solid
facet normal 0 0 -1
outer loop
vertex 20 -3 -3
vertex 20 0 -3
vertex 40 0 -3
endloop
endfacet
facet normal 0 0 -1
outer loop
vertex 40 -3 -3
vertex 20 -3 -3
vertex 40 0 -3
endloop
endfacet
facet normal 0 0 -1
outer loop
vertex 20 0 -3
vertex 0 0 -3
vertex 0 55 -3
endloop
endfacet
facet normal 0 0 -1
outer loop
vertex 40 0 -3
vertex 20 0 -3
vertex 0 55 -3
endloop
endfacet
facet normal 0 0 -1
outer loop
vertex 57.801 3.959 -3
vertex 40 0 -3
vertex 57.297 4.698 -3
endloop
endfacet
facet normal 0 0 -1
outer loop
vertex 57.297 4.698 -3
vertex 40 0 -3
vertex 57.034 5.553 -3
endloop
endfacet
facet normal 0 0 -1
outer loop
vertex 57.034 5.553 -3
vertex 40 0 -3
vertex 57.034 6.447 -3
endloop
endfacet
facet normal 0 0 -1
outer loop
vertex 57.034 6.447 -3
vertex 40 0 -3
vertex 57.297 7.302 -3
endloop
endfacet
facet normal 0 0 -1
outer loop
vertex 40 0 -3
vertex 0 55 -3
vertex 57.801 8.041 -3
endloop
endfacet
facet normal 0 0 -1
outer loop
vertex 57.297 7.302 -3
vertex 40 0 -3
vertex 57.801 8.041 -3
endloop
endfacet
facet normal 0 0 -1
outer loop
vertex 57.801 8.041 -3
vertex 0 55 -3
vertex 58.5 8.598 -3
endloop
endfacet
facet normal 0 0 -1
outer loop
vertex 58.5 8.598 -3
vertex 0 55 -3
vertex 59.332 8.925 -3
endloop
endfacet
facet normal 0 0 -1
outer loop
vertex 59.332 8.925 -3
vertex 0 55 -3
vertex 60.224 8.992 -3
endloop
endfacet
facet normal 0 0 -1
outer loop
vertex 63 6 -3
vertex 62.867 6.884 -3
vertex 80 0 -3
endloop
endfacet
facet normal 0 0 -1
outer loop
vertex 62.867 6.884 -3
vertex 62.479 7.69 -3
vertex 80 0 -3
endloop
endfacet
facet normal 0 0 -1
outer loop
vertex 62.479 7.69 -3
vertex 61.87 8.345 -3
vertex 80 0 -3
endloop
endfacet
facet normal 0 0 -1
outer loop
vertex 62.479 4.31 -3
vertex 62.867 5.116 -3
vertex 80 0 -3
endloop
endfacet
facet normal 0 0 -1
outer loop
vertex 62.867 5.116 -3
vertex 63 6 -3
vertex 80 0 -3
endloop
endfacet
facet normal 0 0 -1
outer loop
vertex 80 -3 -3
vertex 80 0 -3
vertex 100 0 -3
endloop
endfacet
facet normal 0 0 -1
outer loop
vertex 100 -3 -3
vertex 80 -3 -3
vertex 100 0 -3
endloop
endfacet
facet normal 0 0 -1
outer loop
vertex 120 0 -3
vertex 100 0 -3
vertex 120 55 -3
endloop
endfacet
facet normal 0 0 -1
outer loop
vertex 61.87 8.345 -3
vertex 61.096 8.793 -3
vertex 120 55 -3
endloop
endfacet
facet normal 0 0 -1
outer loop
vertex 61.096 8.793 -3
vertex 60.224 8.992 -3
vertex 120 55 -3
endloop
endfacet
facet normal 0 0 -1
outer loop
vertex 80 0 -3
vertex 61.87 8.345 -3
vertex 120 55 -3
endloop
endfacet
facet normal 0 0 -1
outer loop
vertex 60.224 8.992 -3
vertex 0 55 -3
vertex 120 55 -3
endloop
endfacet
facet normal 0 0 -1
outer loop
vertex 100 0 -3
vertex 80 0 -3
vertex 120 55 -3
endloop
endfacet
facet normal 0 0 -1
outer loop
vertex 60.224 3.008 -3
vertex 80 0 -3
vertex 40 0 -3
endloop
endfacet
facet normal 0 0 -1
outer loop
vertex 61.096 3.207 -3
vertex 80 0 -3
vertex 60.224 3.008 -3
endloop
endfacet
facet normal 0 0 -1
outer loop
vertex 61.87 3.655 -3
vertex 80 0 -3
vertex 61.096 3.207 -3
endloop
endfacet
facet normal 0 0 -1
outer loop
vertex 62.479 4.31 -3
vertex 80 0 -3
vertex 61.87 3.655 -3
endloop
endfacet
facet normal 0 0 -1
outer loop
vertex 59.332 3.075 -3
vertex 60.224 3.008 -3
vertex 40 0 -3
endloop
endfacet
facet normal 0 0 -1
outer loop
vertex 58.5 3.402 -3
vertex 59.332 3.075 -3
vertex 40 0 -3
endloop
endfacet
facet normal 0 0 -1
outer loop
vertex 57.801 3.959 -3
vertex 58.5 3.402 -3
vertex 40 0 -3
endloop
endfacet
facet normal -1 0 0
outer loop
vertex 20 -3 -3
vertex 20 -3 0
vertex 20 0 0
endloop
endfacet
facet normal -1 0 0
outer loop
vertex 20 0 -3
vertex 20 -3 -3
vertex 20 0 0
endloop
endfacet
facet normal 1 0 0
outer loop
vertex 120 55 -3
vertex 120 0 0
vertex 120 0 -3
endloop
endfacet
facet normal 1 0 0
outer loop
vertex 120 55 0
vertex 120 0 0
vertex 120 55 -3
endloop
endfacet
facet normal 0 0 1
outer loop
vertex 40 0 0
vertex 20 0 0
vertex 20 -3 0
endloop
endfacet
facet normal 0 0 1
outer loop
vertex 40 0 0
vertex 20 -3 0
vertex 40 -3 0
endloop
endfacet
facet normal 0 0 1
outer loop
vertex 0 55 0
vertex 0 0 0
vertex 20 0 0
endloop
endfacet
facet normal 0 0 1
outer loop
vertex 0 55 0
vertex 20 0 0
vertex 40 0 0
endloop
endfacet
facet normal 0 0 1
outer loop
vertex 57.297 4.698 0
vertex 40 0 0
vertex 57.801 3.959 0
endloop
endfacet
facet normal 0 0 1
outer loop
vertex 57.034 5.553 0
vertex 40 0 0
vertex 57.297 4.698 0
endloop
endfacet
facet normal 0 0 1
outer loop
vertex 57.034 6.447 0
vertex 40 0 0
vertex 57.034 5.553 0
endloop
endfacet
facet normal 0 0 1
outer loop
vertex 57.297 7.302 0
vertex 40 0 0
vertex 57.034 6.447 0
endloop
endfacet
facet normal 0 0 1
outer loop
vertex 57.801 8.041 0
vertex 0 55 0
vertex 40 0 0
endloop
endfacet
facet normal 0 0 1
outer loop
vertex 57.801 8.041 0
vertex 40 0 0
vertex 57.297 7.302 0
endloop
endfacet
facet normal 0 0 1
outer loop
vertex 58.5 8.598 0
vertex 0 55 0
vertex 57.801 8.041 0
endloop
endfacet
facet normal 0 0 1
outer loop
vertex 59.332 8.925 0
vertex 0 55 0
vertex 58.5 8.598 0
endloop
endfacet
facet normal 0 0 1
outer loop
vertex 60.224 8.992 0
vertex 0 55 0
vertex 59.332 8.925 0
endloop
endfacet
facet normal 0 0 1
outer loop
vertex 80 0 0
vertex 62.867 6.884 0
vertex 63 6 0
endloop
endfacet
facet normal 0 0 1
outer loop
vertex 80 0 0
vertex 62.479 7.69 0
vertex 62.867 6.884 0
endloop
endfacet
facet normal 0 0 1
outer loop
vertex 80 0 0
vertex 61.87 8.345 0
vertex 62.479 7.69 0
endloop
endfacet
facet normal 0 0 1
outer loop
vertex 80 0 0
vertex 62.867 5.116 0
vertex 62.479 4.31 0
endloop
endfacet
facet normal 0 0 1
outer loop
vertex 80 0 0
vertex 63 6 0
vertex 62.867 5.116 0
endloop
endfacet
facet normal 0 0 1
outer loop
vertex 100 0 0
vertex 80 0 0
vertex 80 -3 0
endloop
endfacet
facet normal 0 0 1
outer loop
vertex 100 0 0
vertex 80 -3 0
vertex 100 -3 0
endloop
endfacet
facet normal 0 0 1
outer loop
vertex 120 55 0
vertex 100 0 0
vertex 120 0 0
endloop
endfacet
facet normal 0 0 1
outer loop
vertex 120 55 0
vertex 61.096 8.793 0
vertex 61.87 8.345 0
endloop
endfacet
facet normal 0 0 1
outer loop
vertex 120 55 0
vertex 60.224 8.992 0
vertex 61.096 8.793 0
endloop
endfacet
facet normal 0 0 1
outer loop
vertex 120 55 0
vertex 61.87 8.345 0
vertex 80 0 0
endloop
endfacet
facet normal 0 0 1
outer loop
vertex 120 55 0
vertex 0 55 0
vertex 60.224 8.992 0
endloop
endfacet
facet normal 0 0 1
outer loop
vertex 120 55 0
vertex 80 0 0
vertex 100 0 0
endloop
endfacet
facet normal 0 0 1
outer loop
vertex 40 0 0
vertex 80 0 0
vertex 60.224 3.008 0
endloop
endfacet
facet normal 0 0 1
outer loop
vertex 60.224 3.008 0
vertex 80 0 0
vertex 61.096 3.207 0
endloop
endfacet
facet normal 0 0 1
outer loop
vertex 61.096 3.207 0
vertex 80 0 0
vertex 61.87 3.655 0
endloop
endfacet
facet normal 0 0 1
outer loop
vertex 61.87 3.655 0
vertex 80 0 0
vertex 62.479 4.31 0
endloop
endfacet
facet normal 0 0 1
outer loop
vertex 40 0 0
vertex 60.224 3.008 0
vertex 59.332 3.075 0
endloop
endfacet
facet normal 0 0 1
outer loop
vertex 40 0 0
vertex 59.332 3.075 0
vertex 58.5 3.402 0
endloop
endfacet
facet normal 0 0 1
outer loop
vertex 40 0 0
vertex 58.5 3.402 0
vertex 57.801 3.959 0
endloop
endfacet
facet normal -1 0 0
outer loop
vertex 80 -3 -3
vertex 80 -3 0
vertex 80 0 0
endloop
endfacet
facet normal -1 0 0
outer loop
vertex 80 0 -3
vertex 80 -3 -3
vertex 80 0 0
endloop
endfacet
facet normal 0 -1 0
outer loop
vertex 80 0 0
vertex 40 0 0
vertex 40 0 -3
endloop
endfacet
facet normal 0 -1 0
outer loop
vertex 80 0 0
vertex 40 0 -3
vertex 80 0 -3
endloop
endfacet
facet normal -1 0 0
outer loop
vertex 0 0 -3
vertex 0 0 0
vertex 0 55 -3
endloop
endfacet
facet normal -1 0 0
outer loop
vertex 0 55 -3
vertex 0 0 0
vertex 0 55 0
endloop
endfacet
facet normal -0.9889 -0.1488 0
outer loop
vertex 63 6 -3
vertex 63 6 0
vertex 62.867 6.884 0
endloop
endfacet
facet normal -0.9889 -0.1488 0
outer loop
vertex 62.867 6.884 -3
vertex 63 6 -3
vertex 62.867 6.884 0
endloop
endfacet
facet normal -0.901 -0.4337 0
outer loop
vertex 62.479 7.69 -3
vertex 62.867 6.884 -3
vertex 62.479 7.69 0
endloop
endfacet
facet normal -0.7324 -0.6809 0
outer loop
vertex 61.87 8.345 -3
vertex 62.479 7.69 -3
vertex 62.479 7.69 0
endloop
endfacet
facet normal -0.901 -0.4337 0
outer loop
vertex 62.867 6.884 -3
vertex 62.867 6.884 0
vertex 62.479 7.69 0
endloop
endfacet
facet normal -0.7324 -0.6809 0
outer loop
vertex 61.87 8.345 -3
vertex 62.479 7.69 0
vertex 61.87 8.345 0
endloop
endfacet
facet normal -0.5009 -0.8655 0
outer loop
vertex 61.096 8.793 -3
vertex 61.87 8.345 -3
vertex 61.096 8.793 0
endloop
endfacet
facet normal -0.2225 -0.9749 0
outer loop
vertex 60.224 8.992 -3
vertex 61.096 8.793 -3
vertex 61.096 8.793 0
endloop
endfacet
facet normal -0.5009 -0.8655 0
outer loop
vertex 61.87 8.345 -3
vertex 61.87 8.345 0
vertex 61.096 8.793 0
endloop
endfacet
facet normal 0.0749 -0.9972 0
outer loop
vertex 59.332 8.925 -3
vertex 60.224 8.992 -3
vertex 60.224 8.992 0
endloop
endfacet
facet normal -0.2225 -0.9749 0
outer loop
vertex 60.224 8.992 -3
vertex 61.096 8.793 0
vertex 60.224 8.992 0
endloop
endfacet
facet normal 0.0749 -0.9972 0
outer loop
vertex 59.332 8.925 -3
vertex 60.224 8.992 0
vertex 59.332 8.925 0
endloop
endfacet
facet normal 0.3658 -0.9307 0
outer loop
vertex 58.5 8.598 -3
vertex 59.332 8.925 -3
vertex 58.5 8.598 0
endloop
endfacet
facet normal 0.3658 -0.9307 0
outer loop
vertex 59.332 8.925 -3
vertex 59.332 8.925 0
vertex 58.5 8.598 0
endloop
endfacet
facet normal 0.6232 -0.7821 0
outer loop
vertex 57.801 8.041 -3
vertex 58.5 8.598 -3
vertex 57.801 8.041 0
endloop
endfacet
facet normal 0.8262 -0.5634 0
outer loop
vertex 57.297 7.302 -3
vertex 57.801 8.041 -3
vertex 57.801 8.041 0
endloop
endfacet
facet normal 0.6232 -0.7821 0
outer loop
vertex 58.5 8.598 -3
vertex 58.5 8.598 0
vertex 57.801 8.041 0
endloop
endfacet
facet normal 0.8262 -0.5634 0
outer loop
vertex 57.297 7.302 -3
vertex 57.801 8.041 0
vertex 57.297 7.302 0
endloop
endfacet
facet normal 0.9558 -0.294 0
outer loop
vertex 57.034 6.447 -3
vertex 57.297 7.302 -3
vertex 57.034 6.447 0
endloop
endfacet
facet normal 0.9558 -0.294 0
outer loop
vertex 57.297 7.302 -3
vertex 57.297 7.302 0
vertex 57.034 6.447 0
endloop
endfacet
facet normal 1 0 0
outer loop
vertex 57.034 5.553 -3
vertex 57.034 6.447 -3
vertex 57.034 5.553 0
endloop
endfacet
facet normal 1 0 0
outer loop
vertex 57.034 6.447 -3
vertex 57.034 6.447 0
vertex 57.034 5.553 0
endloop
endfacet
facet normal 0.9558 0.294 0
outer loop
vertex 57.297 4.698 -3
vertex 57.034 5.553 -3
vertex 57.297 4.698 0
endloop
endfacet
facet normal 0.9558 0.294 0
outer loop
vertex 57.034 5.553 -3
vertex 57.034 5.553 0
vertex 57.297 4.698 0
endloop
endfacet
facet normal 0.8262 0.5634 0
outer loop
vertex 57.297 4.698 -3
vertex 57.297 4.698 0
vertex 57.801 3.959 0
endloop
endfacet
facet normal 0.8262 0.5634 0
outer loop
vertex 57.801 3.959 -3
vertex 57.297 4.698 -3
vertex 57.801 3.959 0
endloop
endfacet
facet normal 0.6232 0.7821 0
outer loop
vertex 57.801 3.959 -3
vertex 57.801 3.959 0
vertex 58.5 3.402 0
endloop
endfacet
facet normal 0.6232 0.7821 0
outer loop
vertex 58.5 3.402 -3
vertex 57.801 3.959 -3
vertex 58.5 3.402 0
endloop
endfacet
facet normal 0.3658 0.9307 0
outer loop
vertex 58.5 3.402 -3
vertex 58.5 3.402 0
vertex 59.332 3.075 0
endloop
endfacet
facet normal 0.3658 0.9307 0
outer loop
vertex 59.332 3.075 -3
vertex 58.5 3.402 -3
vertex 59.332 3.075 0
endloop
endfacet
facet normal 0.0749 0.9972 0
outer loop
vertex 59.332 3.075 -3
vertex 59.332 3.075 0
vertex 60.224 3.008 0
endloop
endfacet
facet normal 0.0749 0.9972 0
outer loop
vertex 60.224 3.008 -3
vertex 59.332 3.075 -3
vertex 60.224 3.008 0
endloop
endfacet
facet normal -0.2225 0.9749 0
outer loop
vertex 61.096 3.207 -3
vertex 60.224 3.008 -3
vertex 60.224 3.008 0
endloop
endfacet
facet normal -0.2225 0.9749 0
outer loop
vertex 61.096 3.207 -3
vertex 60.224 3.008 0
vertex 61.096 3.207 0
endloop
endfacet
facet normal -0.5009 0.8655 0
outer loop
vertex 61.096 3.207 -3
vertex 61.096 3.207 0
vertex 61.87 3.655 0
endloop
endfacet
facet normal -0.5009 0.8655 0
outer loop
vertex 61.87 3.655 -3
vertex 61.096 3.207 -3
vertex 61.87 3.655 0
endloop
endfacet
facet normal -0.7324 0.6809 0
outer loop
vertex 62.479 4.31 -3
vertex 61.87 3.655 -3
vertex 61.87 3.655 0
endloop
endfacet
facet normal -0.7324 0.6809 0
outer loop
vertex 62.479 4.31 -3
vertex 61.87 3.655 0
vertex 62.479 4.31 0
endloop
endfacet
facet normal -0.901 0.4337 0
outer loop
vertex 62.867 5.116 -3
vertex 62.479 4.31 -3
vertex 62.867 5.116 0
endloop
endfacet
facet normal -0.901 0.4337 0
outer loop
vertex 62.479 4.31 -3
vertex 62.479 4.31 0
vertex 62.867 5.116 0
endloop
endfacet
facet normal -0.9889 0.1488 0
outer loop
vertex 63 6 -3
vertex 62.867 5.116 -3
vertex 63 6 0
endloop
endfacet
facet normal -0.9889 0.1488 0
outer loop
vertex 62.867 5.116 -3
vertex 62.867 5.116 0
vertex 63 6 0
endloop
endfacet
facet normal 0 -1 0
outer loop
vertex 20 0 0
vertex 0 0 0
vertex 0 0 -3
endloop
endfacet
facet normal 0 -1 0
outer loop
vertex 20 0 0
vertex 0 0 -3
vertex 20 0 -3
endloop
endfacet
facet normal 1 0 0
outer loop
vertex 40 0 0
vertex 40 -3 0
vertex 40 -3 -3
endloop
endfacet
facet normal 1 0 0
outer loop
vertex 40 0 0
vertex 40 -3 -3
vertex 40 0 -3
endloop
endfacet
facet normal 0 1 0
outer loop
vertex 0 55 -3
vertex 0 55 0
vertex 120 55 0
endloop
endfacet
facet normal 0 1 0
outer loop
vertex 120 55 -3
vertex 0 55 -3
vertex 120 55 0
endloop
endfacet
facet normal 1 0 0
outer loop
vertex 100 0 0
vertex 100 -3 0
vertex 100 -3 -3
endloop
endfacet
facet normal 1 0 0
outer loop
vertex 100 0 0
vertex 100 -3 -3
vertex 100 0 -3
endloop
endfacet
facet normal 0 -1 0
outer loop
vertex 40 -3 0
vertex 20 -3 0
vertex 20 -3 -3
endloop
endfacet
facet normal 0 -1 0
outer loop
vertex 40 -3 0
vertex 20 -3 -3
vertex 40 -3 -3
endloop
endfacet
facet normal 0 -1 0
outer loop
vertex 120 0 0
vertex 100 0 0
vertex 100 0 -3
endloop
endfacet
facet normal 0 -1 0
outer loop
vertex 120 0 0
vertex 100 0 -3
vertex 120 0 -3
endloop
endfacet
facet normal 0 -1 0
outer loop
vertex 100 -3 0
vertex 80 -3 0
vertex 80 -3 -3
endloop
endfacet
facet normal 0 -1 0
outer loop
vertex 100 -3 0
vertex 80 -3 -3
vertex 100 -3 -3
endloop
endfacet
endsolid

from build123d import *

# Parameters (mm, degrees)
SKETCH1_W           = 120
SKETCH1_H           = 55
SKETCH1_R           = 3
BOSS_EXTRUDE1_DEPTH = 3
SKETCH2_W           = 20
SKETCH2_H           = 3
BOSS_EXTRUDE2_DEPTH = 3


with BuildPart() as part:
    # Sketch1 → Boss-Extrude1 (new body)
    with BuildSketch(Plane.XY):
        with Locations((60, 27.5)):
            Rectangle(SKETCH1_W, SKETCH1_H)
        with Locations((60, 6)):
            Circle(SKETCH1_R, mode=Mode.SUBTRACT)
    extrude(amount=-BOSS_EXTRUDE1_DEPTH)

    # Sketch2 → Boss-Extrude2 (add)
    with BuildSketch(Plane.XY):
        with Locations((30, -1.5)):
            Rectangle(SKETCH2_W, SKETCH2_H)
        with Locations((90, -1.5)):
            Rectangle(SKETCH2_W, SKETCH2_H)
    extrude(amount=-BOSS_EXTRUDE2_DEPTH)


solid = part.part
